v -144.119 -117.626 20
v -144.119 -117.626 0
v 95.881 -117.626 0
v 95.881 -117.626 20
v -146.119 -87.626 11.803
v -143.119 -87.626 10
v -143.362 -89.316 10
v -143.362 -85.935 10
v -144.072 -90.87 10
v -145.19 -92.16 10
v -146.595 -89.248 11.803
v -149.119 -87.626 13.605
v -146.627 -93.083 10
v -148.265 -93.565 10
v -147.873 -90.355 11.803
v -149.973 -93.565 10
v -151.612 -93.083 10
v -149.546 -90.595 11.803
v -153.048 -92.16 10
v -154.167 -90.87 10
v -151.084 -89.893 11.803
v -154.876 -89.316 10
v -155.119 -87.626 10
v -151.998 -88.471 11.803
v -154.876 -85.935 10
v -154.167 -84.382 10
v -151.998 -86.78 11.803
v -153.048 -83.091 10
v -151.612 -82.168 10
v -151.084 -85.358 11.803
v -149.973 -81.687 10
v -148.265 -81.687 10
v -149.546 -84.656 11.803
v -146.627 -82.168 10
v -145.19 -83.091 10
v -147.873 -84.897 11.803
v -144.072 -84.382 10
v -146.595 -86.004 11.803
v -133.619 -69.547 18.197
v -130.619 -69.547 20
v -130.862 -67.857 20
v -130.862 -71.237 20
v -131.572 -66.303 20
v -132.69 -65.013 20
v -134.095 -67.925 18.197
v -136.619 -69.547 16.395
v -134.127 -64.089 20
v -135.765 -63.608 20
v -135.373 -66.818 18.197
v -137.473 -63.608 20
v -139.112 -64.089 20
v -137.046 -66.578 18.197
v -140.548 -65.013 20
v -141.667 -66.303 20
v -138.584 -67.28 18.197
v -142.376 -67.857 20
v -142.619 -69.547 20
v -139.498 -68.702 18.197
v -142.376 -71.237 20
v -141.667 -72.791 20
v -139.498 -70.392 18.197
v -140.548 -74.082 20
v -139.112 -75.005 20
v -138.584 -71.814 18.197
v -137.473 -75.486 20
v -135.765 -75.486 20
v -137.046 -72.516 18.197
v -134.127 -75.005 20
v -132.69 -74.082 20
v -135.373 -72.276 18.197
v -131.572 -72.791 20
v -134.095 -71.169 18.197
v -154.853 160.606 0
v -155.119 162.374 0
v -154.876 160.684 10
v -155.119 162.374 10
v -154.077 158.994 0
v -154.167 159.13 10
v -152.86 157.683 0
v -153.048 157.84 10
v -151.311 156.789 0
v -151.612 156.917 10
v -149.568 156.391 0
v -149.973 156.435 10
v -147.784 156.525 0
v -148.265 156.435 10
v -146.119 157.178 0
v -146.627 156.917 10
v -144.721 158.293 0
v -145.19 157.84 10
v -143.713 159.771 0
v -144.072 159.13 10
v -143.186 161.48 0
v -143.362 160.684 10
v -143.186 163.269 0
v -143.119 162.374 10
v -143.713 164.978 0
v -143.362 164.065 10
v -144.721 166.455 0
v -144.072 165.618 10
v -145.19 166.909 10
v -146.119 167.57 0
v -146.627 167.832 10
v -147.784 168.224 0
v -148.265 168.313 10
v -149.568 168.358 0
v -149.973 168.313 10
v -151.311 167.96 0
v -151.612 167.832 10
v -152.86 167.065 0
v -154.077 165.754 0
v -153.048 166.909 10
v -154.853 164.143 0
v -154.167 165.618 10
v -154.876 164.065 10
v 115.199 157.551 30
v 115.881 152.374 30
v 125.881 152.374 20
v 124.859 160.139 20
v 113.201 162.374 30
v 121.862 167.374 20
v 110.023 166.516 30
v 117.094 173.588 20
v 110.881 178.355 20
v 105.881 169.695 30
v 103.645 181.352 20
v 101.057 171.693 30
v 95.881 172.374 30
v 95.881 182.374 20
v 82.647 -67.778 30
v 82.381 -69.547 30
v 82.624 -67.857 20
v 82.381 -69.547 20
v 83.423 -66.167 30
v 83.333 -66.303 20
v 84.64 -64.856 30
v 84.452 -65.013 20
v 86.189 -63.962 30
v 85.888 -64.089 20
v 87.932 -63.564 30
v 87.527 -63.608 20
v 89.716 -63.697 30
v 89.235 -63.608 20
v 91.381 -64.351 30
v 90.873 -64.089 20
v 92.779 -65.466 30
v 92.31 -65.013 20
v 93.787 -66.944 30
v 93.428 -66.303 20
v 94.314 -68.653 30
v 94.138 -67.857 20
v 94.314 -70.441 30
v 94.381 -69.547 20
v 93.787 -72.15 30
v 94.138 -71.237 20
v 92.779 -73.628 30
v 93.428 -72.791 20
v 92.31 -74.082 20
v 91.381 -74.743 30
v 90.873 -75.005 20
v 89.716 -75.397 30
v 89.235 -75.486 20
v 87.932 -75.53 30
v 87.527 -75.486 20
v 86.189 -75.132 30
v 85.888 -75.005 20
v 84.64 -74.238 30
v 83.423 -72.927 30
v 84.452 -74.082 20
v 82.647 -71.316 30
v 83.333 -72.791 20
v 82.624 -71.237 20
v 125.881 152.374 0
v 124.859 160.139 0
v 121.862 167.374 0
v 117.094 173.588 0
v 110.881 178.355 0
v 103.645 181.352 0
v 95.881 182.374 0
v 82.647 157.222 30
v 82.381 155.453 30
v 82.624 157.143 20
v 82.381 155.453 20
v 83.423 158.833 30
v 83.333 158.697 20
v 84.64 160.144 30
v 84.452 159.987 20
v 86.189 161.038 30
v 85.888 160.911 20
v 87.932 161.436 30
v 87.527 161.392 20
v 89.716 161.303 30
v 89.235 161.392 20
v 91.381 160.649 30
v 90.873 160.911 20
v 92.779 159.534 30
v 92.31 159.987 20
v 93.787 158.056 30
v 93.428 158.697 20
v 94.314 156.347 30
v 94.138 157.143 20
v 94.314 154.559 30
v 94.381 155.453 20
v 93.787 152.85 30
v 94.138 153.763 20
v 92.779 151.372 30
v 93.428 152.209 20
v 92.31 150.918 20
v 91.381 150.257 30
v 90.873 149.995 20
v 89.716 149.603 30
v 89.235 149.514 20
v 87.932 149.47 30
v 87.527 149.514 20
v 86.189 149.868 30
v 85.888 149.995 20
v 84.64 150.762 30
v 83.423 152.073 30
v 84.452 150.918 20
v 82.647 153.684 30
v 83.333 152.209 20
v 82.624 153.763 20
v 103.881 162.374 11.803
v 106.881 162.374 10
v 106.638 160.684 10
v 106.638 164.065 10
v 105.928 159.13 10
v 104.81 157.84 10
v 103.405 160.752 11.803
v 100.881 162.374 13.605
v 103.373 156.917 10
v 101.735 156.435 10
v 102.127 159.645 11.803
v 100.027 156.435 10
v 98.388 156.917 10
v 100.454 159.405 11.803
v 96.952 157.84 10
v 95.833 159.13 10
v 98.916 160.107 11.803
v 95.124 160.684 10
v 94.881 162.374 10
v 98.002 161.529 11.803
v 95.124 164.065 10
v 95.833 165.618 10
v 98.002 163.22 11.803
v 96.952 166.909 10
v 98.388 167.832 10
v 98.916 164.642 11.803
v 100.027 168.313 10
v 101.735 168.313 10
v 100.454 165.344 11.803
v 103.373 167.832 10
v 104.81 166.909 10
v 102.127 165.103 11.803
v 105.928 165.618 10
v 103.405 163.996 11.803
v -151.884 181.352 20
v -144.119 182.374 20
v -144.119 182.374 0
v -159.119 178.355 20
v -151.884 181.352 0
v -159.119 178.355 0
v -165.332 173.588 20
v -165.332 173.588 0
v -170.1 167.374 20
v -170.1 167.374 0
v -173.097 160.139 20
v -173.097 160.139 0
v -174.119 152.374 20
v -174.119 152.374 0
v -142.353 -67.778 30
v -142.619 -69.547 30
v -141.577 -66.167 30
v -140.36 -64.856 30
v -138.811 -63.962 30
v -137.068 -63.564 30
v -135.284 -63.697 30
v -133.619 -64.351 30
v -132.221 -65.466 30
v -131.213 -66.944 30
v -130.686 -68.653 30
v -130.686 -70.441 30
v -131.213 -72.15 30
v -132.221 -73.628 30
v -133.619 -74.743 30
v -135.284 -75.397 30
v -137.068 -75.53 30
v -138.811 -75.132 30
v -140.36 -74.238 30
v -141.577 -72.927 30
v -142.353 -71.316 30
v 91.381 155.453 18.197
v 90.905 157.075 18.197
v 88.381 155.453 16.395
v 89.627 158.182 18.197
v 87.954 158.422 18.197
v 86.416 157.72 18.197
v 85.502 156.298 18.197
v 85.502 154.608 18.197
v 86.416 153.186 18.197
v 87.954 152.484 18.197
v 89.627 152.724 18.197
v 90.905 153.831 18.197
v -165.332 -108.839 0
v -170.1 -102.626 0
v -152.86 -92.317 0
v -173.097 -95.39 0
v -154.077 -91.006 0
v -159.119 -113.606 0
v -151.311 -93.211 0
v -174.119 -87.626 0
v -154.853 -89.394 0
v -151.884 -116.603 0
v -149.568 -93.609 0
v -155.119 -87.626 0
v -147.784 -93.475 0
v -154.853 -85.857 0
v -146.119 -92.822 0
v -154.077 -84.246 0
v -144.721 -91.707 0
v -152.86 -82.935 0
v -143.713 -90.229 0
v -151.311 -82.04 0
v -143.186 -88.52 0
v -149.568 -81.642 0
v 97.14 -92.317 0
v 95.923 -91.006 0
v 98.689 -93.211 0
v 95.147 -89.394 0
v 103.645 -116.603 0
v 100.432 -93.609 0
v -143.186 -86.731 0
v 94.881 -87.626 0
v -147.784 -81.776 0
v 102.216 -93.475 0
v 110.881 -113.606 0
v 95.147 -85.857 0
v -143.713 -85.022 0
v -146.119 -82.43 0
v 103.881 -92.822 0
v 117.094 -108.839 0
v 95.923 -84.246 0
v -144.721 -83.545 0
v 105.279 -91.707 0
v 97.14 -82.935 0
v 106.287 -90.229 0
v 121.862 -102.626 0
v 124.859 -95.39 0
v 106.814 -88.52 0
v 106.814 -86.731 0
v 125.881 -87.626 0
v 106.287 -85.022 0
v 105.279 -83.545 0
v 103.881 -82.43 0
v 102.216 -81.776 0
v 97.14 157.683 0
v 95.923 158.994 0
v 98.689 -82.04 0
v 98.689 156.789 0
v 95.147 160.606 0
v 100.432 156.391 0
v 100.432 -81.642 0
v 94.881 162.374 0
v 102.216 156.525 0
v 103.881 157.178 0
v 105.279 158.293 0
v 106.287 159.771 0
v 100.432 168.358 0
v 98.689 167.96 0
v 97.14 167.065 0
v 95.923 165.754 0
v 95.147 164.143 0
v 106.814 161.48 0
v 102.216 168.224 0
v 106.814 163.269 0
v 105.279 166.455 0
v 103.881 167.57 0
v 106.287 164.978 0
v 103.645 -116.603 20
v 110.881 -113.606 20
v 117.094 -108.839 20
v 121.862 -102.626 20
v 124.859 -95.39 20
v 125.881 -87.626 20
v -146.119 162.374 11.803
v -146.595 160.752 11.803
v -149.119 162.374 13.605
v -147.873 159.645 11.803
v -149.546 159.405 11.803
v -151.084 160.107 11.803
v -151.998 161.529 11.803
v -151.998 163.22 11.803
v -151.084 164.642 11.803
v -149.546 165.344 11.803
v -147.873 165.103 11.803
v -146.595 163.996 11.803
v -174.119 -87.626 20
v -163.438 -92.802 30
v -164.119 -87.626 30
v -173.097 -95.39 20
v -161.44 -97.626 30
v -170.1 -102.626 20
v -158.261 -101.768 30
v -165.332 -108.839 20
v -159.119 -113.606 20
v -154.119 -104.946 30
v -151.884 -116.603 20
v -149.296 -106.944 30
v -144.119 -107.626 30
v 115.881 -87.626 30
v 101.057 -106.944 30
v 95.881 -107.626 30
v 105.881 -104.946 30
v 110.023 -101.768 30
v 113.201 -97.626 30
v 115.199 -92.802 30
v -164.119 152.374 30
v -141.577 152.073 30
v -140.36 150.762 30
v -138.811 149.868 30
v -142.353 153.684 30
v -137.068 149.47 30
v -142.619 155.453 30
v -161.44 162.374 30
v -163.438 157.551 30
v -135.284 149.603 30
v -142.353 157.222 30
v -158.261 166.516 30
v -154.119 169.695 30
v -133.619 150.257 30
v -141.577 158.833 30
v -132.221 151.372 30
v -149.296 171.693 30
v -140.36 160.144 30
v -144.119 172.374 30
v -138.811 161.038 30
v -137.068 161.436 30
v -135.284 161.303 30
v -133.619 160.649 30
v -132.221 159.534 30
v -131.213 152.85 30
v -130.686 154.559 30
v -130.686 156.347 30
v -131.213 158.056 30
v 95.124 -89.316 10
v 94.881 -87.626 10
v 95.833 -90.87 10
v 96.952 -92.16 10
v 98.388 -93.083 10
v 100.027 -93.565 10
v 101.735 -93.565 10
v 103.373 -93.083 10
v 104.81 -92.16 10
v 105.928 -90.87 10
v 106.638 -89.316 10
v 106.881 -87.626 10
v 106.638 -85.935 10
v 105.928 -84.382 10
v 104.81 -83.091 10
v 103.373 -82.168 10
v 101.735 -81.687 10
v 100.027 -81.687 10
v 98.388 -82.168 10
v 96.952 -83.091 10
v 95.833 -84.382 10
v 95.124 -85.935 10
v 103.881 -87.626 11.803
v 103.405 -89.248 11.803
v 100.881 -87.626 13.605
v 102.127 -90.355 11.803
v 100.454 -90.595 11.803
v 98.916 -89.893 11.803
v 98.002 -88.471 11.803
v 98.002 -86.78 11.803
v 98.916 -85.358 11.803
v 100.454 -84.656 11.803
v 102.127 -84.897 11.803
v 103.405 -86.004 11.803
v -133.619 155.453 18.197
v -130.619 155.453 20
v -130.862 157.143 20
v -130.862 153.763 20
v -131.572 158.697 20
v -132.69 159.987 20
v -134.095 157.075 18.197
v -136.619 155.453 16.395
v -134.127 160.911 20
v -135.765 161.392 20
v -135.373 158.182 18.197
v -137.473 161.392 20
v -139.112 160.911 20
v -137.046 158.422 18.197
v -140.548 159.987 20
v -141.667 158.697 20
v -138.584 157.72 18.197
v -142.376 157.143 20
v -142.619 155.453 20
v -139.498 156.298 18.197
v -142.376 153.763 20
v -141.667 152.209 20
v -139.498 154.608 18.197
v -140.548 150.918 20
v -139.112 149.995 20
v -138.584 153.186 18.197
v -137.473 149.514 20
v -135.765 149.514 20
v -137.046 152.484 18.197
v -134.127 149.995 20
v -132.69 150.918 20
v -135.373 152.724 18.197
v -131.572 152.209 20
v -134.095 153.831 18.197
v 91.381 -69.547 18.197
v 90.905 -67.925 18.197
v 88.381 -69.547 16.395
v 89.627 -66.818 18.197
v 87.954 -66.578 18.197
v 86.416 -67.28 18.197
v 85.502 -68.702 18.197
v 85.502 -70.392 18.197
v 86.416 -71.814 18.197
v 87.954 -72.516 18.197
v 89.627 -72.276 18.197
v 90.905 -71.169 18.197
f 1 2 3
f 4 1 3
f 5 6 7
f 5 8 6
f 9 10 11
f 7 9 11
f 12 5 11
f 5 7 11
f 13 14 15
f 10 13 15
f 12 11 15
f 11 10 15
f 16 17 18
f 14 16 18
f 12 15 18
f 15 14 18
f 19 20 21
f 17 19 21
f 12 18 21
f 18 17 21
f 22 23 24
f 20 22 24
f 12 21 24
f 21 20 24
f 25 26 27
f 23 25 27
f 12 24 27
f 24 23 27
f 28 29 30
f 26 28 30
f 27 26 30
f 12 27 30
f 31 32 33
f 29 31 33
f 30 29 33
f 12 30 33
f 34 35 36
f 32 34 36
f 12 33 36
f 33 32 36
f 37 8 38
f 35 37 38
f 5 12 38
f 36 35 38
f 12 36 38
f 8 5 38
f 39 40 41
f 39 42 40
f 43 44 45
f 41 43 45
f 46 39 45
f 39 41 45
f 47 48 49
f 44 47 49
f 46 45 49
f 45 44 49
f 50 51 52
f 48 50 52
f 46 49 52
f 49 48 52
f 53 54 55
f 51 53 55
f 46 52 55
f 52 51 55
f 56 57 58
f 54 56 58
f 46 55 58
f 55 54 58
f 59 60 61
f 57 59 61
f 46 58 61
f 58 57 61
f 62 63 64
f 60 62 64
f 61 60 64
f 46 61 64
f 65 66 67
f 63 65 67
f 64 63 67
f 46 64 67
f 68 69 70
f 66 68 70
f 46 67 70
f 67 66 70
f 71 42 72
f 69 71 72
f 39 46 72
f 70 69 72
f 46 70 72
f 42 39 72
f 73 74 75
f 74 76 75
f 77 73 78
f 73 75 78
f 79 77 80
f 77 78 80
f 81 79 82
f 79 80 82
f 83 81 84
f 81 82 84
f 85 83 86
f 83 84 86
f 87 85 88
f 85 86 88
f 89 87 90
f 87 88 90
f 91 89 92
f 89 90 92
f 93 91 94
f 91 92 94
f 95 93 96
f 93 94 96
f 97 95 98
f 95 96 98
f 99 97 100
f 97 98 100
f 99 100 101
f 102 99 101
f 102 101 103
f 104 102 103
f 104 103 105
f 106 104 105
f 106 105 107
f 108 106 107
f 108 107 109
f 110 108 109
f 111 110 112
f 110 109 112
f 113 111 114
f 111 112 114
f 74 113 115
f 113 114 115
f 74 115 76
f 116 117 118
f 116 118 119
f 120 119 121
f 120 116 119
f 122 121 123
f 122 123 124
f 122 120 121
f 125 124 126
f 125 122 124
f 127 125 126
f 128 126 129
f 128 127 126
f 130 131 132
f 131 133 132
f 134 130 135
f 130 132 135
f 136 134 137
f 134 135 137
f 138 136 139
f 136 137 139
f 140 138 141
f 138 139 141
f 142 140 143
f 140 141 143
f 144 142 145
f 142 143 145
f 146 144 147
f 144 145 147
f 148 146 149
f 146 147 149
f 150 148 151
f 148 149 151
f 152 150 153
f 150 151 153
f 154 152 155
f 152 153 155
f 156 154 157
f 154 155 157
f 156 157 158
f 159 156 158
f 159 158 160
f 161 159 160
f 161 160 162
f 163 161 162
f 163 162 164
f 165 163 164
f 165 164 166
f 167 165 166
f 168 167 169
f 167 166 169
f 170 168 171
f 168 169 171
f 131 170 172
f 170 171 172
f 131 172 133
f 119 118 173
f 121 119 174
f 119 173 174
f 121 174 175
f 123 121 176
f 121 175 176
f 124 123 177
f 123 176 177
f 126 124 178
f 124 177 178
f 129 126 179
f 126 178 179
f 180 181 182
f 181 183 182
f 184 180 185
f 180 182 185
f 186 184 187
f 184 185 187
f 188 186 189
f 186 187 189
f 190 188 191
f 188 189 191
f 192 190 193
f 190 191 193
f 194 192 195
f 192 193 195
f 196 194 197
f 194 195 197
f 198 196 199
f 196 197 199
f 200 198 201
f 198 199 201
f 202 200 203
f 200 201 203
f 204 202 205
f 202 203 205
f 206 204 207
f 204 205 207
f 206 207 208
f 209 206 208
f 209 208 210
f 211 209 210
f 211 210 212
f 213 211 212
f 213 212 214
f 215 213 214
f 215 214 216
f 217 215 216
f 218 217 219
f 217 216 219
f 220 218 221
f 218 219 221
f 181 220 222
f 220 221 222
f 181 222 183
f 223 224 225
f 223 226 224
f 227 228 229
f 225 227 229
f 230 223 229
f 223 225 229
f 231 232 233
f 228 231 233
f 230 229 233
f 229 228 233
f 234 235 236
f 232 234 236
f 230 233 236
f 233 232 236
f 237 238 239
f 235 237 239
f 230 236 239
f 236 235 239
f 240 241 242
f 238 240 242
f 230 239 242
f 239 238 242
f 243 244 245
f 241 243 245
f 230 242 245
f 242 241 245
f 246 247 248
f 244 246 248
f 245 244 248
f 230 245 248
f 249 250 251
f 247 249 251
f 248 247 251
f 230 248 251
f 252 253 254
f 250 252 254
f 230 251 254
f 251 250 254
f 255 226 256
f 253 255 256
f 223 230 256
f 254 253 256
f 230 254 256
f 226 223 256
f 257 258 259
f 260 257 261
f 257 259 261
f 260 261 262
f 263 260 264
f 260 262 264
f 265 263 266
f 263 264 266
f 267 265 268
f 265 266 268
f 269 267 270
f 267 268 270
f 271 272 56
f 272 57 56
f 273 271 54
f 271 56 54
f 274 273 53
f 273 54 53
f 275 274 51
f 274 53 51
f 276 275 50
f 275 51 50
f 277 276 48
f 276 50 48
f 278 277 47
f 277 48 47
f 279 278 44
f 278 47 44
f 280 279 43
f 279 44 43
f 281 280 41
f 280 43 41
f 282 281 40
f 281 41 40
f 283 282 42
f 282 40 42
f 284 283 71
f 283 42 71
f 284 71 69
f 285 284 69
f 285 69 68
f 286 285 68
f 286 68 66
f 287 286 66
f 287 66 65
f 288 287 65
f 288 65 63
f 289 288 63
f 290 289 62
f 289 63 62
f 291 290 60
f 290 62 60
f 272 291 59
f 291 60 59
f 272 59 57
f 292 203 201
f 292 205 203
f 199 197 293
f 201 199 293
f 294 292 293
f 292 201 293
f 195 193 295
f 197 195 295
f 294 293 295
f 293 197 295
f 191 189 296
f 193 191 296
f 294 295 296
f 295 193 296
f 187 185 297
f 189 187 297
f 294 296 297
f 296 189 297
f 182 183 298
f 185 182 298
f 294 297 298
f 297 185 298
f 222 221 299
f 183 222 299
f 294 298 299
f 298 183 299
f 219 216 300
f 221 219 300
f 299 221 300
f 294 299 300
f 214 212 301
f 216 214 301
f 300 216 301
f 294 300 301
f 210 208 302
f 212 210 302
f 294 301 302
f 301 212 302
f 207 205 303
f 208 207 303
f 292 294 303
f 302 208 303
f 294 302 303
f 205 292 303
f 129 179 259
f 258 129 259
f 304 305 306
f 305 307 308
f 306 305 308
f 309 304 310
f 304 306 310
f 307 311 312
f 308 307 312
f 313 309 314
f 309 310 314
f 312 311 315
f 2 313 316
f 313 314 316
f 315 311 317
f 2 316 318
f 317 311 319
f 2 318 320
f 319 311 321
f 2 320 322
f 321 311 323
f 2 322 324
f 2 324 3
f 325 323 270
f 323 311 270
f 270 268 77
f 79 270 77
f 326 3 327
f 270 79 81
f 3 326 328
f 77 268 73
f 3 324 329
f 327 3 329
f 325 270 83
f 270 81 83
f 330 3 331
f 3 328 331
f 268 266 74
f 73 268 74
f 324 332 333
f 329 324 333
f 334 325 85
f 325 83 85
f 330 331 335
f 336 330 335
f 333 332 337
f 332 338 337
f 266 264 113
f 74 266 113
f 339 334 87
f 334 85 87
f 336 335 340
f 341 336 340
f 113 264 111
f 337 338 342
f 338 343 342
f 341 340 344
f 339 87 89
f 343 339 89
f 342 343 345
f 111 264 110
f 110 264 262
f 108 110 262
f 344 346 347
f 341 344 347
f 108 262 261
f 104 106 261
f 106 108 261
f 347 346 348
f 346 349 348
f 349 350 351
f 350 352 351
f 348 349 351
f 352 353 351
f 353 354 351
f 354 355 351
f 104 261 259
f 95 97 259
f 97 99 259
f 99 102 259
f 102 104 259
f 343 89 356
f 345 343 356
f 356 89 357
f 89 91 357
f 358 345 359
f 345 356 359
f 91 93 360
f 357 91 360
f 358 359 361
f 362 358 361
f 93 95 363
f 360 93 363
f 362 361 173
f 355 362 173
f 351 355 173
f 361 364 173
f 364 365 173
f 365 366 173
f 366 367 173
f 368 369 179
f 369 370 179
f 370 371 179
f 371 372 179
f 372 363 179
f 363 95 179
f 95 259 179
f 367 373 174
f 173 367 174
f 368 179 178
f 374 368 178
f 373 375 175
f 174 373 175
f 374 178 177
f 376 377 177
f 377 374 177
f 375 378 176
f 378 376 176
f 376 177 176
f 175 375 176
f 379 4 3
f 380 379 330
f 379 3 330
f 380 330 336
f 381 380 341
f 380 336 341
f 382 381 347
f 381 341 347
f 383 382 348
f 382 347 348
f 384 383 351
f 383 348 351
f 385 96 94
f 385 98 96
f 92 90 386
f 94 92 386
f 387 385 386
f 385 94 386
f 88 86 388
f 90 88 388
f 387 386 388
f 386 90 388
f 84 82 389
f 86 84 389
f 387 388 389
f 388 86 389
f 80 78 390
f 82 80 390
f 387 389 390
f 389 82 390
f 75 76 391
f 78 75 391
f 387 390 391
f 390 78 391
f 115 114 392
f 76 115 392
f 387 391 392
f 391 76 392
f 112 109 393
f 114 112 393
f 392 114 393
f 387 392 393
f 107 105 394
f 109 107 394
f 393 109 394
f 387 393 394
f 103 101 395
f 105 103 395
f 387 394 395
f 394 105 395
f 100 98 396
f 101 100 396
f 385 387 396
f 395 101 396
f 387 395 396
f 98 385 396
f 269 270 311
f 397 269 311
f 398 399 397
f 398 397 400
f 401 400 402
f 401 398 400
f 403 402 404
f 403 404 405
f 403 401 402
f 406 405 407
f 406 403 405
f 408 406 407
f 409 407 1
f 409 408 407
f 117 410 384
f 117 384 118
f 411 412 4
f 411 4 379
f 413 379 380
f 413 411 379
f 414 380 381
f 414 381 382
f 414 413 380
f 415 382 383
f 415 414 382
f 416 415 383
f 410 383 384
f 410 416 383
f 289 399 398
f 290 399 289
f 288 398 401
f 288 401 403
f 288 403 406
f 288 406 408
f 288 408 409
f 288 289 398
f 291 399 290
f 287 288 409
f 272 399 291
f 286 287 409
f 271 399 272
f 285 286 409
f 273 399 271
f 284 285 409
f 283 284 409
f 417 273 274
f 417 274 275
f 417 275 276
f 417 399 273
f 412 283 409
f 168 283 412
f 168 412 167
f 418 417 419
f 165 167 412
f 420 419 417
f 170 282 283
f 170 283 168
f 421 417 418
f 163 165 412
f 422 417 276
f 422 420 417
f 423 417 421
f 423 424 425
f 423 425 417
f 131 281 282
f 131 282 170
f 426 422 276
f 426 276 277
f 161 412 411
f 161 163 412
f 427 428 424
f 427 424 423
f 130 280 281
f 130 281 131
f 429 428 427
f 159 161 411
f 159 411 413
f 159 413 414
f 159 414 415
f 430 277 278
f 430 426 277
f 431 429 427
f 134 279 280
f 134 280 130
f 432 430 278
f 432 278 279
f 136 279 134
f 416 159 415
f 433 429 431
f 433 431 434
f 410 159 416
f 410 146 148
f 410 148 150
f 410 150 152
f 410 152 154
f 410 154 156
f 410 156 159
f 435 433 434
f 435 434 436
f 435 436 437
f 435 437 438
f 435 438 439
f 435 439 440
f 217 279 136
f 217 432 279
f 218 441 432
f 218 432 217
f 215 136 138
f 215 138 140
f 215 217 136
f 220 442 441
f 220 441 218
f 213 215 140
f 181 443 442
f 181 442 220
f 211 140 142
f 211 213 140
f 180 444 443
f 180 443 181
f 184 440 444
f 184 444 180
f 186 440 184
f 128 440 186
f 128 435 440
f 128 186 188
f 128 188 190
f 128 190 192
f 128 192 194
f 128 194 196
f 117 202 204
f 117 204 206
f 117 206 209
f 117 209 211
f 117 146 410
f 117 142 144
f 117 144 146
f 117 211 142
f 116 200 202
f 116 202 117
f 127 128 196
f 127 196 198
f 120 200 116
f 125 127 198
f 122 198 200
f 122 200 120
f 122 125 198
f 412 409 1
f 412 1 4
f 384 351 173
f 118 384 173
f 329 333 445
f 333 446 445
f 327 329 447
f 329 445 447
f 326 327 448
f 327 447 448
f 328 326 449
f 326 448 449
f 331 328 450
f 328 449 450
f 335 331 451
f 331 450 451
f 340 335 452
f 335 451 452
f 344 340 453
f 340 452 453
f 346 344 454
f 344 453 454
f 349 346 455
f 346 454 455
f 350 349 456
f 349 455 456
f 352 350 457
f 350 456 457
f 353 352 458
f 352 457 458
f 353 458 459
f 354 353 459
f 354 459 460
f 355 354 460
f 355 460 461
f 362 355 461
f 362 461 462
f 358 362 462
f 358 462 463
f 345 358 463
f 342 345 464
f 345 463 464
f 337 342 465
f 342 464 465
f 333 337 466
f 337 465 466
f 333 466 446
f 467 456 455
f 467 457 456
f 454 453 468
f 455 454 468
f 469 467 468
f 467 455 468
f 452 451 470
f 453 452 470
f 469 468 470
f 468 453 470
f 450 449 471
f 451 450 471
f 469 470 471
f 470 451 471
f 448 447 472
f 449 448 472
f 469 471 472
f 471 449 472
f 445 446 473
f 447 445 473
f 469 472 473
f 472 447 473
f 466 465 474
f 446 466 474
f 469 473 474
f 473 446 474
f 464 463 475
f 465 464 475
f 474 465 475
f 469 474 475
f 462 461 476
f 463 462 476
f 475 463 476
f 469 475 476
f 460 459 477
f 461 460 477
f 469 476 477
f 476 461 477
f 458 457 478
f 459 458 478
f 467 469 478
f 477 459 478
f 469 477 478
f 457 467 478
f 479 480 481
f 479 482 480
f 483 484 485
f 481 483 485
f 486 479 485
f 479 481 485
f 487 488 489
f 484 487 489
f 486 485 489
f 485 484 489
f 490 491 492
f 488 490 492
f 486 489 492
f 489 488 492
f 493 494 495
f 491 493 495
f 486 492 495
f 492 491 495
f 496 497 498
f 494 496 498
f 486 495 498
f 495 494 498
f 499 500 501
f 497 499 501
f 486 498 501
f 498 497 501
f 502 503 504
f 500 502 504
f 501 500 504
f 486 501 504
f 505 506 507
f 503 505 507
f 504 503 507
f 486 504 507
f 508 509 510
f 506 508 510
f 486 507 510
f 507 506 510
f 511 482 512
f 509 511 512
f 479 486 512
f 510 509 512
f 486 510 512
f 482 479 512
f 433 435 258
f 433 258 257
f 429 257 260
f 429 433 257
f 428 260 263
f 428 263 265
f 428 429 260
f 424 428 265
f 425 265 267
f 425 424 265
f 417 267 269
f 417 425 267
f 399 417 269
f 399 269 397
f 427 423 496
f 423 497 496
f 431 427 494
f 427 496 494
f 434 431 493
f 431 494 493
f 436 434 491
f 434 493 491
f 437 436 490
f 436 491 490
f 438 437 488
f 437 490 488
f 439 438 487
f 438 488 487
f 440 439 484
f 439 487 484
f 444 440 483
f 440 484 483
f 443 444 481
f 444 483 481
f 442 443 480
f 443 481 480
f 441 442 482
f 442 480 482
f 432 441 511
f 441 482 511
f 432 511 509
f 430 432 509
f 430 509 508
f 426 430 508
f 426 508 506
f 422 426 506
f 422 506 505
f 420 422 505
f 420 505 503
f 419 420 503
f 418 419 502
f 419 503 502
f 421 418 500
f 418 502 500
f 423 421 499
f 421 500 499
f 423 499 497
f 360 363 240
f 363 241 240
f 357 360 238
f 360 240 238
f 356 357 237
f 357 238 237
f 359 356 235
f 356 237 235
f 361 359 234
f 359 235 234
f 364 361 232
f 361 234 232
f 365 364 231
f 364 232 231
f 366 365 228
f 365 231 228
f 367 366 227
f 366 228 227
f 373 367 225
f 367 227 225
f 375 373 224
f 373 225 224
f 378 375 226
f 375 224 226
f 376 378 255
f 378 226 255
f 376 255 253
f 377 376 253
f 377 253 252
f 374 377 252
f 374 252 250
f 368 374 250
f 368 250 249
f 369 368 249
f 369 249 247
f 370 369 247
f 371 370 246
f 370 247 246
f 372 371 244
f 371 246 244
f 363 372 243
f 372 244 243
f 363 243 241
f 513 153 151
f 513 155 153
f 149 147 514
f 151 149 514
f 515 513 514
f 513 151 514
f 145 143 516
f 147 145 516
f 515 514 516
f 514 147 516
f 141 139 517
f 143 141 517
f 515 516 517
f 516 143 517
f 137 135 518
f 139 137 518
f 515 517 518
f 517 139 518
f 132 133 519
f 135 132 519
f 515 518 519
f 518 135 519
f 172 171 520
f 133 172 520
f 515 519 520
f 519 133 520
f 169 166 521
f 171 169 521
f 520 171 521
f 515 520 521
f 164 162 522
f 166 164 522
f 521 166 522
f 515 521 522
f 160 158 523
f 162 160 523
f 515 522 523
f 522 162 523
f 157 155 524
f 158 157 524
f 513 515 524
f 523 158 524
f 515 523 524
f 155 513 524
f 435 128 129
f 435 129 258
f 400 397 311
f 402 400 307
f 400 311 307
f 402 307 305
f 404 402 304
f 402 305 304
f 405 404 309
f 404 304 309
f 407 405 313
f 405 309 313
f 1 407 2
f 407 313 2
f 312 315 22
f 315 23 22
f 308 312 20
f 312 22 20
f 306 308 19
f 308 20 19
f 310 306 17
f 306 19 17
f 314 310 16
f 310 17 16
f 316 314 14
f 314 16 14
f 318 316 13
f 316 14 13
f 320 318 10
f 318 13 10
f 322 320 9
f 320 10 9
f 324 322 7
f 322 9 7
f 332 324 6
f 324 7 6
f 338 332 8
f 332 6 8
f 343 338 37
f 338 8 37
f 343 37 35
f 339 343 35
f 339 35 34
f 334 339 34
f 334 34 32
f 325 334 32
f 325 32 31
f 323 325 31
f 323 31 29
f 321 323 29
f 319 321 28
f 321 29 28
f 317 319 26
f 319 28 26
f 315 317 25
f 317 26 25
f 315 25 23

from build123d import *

# Parameters (mm, degrees)
F1_DEPTH = 30
F3_D     = 12
F3_DEPTH = 10
F3_TIP   = 3.6051637142
F4_SIZE2 = 10
F4_SIZE  = 10
F6_D     = 12
F6_DEPTH = 10
F6_TIP   = 3.6051637142


with BuildPart() as f1:
    # F0 (on Top) → F1 (new body)
    with BuildSketch(Plane.XY):
        with BuildLine():
            Line((95.8808709681, 182.3743300438), (-144.1191290319, 182.3743300438))
            ThreePointArc((-144.1191290319, 182.3743300438), (-165.3323324675, 173.5875334794), (-174.1191290319, 152.3743300438))
            Line((-174.1191290319, 152.3743300438), (-174.1191290319, -87.6256699562))
            ThreePointArc((-174.1191290319, -87.6256699562), (-165.3323324675, -108.8388733918), (-144.1191290319, -117.6256699562))
            Line((-144.1191290319, -117.6256699562), (95.8808709681, -117.6256699562))
            ThreePointArc((95.8808709681, -117.6256699562), (117.0940744037, -108.8388733918), (125.8808709681, -87.6256699562))
            Line((125.8808709681, -87.6256699562), (125.8808709681, 152.3743300438))
            ThreePointArc((125.8808709681, 152.3743300438), (117.0940744037, 173.5875334794), (95.8808709681, 182.3743300438))
        make_face()
    extrude(amount=F1_DEPTH)

    # F3
    with Locations(Plane.XY.offset(30)):
        with Locations((-136.6191290319, 155.4529928305), (88.3808709681, 155.4529928305), (-136.6191290319, -69.5470071695), (88.3808709681, -69.5470071695)):
            Hole(F3_D / 2, depth=F3_DEPTH)
            with Locations((0, 0, -(F3_DEPTH + F3_TIP / 2))):  # 118° drill point
                Cone(0, F3_D / 2, F3_TIP, mode=Mode.SUBTRACT)

    # F4
    f4_edges = [f1.edges().sort_by_distance(p)[0] for p in [
        (-165.332332, 173.587533, 30),
        (-174.119129, 32.37433, 30),
        (-165.332332, -108.838873, 30),
        (-24.119129, -117.62567, 30),
        (117.094074, -108.838873, 30),
        (125.880871, 32.37433, 30),
        (117.094074, 173.587533, 30),
        (-24.119129, 182.37433, 30),
    ]]
    chamfer(f4_edges, length=F4_SIZE, length2=F4_SIZE2)

    # F6
    with Locations(Plane(origin=(0, 0, 0), x_dir=(1, 0, 0), z_dir=(0, 0, -1))):
        with Locations((-149.1191290319, 87.6256699562), (100.8808709681, 87.6256699562), (-149.1191290319, -162.3743300438), (100.8808709681, -162.3743300438)):
            Hole(F6_D / 2, depth=F6_DEPTH)
            with Locations((0, 0, -(F6_DEPTH + F6_TIP / 2))):  # 118° drill point
                Cone(0, F6_D / 2, F6_TIP, mode=Mode.SUBTRACT)


solid = f1.part
